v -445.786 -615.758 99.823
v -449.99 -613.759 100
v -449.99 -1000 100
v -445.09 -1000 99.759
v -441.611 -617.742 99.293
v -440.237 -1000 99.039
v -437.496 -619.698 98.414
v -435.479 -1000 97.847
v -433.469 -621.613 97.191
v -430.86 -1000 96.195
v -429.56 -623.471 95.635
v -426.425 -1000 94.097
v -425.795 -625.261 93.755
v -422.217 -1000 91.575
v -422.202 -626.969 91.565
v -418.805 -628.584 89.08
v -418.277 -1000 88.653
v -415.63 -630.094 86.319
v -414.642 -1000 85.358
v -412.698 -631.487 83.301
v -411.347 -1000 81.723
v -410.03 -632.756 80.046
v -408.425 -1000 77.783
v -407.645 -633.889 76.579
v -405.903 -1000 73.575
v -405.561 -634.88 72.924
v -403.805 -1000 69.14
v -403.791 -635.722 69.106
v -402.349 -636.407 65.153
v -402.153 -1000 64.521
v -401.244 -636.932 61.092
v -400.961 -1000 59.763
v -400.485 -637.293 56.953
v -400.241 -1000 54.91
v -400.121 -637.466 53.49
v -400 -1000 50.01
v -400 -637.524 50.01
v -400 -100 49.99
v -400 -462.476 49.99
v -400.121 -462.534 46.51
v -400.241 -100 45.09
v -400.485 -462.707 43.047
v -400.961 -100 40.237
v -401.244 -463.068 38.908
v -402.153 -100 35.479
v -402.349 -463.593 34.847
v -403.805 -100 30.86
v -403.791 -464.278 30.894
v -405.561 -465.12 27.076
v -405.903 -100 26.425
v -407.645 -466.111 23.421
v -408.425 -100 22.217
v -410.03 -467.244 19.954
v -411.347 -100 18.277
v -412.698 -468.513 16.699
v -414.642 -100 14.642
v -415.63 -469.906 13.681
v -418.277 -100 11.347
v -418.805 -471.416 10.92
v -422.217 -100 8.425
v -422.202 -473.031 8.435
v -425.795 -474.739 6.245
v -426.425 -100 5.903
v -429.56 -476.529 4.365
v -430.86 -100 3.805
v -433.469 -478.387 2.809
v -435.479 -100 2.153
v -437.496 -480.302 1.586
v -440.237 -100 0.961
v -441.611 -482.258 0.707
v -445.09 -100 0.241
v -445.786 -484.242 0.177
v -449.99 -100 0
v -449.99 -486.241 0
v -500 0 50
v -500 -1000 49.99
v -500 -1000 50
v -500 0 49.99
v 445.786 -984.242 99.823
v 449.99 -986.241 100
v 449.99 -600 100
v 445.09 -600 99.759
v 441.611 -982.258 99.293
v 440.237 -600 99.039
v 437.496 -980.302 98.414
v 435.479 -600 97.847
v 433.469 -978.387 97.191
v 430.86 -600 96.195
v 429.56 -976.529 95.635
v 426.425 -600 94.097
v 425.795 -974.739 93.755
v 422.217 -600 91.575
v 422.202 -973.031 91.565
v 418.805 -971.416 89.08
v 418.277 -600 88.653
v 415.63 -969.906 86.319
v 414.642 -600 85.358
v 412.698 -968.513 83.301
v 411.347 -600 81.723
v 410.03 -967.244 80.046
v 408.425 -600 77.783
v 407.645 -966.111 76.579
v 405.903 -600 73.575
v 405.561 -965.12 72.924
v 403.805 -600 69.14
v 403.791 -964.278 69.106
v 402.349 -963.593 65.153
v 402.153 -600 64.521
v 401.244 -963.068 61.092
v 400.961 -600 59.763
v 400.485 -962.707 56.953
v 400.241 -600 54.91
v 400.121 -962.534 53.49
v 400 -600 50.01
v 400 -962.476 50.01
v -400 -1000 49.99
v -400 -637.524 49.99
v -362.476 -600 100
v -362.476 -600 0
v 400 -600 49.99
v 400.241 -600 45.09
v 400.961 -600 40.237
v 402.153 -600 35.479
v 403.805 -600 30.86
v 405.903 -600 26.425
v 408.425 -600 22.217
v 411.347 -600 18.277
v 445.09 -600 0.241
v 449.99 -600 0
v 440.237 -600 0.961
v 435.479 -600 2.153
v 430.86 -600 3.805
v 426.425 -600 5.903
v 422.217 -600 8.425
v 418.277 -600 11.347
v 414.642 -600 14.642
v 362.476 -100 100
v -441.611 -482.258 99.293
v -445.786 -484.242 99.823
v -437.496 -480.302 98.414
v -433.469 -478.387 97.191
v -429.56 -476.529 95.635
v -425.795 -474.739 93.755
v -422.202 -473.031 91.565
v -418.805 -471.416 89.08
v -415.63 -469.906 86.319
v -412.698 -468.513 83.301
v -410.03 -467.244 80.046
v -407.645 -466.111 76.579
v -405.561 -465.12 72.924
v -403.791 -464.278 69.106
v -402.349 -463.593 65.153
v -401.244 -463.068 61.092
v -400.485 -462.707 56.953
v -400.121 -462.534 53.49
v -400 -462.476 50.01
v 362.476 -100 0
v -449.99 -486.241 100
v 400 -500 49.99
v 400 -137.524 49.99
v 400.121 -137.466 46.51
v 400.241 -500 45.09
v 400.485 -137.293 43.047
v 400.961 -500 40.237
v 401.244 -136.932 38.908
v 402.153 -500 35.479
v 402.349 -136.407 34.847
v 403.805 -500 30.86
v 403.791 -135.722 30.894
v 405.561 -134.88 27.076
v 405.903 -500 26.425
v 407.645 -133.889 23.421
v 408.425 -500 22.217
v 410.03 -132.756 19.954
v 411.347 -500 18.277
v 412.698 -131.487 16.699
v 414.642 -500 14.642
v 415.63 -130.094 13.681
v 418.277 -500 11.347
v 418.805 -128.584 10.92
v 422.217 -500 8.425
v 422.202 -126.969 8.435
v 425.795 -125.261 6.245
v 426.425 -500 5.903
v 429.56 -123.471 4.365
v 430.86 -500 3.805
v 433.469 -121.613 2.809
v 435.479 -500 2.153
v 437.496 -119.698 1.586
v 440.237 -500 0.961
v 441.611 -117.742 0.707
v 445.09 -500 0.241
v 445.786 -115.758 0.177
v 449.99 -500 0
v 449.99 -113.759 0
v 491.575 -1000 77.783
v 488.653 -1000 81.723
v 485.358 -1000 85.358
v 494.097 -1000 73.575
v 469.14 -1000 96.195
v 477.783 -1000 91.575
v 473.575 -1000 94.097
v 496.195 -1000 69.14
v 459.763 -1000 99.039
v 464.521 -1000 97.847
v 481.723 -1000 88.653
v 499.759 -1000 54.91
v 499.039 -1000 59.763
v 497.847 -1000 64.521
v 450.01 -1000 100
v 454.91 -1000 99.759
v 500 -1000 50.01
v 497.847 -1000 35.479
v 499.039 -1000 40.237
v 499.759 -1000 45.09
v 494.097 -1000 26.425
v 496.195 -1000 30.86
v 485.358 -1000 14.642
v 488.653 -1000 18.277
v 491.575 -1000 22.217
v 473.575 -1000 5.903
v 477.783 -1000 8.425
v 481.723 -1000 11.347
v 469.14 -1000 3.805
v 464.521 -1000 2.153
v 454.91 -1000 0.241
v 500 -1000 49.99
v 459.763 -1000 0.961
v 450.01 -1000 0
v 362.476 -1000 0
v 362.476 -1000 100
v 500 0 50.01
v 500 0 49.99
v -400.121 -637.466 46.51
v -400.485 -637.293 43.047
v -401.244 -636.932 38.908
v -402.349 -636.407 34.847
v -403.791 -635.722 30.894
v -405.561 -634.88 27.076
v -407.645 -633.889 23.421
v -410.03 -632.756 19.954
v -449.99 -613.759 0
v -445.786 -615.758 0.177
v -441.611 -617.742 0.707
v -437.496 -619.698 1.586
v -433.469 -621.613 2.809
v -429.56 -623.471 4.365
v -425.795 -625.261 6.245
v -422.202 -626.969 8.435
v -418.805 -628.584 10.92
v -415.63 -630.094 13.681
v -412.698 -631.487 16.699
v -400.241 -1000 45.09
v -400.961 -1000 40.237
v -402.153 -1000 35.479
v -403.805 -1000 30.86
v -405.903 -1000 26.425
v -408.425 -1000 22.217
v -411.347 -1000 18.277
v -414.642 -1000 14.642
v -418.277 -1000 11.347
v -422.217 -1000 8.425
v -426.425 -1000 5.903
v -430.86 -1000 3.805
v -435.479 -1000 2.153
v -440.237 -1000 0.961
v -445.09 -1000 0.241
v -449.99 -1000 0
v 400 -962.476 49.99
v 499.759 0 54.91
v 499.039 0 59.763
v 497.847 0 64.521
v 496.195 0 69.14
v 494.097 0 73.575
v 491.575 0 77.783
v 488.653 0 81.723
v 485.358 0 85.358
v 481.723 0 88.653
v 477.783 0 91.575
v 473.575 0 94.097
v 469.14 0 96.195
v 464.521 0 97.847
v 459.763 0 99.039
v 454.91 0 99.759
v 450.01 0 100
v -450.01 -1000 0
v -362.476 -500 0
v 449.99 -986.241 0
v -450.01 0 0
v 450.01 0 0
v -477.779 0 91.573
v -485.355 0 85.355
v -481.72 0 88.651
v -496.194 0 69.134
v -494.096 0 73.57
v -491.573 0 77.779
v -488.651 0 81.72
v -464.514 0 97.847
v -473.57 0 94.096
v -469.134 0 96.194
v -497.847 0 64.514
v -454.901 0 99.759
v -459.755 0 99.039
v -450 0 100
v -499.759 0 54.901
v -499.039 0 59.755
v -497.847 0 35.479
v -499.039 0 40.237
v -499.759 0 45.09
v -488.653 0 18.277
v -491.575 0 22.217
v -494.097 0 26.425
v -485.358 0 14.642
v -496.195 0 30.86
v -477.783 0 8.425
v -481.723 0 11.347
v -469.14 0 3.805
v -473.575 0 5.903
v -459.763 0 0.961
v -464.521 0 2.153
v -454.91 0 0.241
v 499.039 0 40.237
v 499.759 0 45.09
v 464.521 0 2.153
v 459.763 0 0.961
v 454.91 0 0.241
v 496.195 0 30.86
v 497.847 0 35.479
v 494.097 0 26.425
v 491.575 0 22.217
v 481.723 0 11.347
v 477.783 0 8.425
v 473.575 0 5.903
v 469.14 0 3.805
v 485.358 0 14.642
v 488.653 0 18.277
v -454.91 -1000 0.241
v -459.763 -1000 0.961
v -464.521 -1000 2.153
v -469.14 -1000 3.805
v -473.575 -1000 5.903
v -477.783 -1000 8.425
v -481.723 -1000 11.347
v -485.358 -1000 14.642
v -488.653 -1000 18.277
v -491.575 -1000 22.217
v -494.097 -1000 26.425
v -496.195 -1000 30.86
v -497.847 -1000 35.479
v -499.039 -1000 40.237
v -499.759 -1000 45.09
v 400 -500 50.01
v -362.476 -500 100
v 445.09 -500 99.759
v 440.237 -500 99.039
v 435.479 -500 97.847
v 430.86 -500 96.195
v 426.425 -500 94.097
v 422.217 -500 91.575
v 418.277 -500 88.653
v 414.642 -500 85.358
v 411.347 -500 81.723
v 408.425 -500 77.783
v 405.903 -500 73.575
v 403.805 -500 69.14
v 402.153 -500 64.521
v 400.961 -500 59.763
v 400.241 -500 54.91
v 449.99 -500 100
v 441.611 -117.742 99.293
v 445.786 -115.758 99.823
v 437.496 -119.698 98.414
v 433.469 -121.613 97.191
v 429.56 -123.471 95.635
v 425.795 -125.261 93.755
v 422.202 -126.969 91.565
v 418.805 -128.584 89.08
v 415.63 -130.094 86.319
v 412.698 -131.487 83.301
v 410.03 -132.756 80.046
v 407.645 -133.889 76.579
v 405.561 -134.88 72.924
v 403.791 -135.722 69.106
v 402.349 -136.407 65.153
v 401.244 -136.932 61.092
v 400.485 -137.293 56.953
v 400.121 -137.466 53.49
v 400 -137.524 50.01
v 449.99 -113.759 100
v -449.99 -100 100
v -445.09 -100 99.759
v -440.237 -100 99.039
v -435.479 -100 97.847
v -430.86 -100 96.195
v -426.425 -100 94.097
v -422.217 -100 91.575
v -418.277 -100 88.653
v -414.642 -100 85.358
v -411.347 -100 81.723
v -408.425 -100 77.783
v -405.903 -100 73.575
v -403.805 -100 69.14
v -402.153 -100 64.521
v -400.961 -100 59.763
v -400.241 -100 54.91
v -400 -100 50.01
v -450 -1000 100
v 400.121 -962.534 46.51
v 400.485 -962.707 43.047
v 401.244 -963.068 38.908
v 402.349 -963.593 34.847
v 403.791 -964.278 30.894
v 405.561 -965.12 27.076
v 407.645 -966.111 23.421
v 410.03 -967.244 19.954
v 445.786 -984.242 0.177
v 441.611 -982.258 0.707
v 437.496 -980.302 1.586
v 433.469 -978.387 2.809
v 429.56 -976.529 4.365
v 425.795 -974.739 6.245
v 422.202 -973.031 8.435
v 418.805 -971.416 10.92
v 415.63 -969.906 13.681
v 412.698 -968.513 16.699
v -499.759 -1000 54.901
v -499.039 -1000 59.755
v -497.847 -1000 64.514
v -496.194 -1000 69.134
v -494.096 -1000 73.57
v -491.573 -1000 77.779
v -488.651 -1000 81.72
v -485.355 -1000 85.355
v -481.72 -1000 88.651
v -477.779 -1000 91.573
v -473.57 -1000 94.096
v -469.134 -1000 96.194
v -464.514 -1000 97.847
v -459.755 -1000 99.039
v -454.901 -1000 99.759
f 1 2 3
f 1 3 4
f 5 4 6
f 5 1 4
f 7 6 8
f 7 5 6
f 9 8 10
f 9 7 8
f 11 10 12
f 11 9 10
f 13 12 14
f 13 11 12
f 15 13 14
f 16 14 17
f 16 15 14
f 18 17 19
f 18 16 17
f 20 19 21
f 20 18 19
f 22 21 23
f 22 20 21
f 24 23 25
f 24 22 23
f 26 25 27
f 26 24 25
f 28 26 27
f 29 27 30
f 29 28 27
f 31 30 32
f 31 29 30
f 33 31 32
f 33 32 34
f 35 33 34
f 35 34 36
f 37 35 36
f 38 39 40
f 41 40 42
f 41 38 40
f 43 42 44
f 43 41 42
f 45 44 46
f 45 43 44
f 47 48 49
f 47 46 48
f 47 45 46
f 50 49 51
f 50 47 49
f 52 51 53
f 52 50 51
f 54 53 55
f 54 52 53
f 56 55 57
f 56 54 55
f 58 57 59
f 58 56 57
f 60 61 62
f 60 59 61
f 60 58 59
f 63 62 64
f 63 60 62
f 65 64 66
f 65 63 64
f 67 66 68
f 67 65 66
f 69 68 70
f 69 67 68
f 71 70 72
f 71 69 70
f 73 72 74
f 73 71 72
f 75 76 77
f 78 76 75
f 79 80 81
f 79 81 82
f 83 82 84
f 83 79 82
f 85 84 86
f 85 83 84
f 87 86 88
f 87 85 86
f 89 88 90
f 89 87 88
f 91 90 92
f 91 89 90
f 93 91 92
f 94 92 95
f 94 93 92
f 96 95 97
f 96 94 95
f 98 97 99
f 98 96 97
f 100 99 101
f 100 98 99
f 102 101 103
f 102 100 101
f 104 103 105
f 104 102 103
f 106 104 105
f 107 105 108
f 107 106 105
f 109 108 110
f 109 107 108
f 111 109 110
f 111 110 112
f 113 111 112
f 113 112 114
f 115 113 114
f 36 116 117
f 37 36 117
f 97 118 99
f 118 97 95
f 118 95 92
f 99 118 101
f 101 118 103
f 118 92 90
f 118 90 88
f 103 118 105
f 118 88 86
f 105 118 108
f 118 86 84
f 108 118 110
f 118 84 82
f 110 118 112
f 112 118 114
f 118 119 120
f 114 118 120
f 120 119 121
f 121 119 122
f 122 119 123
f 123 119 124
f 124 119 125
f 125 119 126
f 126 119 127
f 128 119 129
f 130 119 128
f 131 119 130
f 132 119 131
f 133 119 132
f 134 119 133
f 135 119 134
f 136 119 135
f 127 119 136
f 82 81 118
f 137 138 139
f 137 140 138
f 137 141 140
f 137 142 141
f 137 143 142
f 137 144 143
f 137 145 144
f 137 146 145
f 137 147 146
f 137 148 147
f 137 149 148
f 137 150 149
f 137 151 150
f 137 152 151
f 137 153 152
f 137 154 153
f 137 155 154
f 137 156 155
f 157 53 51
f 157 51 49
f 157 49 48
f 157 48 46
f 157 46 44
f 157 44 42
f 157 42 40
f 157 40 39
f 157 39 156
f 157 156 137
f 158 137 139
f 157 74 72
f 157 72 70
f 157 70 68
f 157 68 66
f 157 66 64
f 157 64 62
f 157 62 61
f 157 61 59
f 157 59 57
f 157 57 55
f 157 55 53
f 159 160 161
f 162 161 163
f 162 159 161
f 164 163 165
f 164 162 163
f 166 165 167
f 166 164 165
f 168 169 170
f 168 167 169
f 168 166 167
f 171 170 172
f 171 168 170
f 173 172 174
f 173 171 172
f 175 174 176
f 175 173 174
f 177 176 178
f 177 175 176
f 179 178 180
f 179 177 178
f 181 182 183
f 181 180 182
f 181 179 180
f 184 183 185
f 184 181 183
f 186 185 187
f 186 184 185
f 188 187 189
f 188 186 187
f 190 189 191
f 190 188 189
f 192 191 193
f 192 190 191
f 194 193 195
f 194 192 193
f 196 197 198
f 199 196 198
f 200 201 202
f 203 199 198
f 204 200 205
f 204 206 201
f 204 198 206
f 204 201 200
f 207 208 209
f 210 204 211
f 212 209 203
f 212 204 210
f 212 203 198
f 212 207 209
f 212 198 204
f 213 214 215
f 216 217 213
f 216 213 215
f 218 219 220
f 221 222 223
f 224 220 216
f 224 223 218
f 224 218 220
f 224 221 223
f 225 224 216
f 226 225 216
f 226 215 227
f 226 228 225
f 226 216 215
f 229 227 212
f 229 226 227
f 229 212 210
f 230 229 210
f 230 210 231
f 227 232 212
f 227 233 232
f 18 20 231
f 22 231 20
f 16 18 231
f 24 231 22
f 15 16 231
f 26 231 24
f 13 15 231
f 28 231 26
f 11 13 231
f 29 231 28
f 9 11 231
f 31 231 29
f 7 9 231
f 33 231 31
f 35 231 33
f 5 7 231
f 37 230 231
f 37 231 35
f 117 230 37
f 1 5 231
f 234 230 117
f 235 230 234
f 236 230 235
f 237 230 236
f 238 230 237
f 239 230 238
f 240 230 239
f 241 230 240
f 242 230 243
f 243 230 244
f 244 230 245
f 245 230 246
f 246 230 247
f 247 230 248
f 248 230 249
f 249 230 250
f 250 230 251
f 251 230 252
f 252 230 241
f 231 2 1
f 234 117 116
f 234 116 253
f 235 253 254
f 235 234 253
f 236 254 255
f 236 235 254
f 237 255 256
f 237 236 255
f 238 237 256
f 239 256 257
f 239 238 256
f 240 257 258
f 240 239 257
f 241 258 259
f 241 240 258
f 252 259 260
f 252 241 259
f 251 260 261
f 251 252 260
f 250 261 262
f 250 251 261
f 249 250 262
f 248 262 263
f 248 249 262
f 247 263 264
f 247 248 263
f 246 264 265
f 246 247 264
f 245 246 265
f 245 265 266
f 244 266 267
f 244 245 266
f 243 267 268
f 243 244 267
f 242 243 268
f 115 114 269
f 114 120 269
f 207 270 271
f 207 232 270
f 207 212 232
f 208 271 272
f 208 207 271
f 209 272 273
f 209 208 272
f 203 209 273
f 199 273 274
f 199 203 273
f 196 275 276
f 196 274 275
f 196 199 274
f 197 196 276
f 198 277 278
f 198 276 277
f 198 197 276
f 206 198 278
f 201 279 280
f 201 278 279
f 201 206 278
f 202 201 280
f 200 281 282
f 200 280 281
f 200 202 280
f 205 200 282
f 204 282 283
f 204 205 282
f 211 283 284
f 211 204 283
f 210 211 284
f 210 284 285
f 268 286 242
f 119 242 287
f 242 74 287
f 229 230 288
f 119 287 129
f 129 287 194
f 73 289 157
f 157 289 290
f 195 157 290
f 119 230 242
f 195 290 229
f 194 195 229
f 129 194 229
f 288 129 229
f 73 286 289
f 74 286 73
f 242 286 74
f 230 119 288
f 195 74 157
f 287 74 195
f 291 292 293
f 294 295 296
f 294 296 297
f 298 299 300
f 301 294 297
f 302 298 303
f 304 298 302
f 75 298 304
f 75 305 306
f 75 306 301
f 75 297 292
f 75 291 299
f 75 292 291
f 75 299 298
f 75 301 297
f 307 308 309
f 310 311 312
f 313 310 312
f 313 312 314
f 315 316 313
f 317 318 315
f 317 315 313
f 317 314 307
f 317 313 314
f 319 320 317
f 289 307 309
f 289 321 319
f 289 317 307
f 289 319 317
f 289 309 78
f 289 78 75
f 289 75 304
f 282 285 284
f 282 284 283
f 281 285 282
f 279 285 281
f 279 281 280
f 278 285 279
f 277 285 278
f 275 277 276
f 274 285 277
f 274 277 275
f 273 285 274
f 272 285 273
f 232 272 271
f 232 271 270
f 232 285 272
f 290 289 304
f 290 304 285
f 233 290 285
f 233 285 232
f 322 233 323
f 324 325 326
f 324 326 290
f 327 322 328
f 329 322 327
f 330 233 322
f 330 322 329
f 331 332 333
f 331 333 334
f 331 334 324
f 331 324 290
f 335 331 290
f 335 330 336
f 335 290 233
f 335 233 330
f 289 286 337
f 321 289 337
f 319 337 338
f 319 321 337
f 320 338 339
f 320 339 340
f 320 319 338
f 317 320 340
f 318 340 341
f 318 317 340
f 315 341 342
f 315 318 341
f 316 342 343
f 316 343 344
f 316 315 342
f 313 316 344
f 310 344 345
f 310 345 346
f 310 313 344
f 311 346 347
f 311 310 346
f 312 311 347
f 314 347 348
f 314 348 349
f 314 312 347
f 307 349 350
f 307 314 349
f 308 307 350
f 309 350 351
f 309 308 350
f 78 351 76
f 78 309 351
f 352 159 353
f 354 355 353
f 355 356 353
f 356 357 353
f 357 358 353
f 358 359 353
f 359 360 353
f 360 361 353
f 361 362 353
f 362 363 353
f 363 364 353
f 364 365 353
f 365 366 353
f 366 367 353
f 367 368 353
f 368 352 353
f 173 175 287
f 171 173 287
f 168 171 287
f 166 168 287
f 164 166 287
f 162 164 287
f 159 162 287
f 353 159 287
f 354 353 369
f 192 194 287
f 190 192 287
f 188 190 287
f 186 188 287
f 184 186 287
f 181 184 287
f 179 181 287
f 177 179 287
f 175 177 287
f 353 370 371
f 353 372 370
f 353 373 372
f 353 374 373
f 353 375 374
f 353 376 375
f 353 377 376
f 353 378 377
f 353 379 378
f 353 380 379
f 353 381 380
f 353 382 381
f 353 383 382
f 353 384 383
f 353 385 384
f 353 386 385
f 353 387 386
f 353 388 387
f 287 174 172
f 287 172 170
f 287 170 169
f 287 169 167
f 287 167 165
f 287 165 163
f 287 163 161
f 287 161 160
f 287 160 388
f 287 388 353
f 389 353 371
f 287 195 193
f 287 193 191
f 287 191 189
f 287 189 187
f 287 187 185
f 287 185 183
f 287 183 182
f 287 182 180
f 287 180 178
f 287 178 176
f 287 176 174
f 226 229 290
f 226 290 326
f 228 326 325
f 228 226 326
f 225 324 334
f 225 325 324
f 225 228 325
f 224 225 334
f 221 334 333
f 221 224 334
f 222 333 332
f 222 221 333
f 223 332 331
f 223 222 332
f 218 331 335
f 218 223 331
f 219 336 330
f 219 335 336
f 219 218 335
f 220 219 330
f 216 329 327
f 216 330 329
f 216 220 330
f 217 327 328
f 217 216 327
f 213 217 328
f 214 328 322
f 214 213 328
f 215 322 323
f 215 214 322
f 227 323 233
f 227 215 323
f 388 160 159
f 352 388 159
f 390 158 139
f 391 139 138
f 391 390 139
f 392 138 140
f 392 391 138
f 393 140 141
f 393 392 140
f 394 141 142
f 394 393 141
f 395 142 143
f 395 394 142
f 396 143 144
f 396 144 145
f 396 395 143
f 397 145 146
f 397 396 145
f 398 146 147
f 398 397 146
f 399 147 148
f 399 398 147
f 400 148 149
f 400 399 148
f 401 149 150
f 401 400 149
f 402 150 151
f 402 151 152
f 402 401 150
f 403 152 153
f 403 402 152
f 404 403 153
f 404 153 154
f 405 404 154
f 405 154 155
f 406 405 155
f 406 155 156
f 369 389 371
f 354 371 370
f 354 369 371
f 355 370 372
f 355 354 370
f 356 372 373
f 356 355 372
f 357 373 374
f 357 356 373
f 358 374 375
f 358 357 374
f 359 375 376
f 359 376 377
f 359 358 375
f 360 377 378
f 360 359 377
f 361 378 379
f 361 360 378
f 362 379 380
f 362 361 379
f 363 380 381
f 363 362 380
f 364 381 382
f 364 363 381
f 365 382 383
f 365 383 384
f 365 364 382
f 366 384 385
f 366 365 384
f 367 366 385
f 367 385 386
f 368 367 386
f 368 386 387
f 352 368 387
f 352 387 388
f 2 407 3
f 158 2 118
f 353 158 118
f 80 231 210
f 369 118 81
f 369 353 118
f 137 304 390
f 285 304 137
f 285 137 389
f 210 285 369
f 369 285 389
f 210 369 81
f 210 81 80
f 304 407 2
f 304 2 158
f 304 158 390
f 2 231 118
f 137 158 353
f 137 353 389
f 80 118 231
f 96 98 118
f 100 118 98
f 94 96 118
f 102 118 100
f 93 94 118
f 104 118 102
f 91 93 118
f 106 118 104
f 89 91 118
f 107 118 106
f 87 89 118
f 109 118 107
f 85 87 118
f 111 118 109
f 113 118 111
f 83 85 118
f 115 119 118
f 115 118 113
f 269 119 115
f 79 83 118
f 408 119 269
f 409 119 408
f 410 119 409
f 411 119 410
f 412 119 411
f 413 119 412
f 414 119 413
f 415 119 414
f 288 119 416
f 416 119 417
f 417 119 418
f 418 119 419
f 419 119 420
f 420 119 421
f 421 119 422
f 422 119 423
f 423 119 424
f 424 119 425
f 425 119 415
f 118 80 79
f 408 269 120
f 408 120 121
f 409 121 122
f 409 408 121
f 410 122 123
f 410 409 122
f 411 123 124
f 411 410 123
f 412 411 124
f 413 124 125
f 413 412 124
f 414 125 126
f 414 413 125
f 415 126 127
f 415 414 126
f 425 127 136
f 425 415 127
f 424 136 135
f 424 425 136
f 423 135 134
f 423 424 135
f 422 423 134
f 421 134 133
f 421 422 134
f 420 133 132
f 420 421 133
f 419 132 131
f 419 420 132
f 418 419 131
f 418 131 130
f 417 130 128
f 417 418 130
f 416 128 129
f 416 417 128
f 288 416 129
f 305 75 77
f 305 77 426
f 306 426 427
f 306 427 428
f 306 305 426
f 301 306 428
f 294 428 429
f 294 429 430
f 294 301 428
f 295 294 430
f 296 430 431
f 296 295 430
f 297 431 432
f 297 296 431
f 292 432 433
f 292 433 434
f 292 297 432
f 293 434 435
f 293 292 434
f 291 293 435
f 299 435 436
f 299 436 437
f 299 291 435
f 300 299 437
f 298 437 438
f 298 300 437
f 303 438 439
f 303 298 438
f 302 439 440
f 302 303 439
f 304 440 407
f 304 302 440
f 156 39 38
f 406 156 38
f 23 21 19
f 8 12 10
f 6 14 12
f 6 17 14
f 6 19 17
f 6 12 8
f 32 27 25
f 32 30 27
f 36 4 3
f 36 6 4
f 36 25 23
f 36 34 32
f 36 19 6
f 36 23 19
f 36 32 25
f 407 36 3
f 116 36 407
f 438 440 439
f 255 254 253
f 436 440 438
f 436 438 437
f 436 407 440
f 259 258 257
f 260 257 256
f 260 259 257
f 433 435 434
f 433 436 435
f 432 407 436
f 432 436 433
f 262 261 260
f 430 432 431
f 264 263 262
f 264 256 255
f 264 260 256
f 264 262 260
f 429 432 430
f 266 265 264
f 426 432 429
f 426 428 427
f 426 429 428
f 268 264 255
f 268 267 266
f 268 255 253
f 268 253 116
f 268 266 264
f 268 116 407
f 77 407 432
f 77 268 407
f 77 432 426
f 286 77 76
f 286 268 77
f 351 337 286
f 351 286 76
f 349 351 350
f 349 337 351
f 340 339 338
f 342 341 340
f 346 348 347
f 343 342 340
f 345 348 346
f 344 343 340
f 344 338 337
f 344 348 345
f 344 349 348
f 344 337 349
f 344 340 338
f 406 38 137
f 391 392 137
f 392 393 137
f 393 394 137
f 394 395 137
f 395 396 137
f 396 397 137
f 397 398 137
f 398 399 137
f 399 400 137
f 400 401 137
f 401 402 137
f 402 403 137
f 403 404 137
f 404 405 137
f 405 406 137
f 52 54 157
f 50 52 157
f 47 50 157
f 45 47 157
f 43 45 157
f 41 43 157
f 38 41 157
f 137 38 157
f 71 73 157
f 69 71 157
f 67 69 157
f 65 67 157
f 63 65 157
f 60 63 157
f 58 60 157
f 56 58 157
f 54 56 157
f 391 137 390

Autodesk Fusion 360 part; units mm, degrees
sketch "スケッチ1" plane through (0, 0, 0) normal (0, 0, 1) x (1, 0, 0)
  line L0 (-500, 0) -> (500, 0)
  line L1 (500, 0) -> (500, -1000)
  line L2 (-500, -1000) -> (-500, 0)
  line L3 (-400, -100) -> (362.4762, -100)
  line L4 (400, -137.5238) -> (400, -500)
  line L5 (400, -500) -> (-362.4762, -500)
  line L6 (-400, -462.4762) -> (-400, -100)
  line L7 (-362.4762, -600) -> (400, -600)
  line L8 (400, -600) -> (400, -962.4762)
  line L9 (400, -1000) -> (362.4762, -1000)
  line L10 (-400, -1000) -> (-400, -637.5238)
  line L11 (-400, -462.4762) -> (362.4762, -100)
  line L12 (400, -137.5238) -> (-362.4762, -500)
  line L13 (-362.4762, -600) -> (400, -962.4762)
  line L14 (362.4762, -1000) -> (-400, -637.5238)
  line L15 (500, -1000) -> (362.4762, -1000)
  line L16 (-400, -1000) -> (-500, -1000)
  line L17 (-400, -462.4762) -> (-400, -500) construction
  line L18 (-400, -500) -> (-362.4762, -500) construction
  line L19 (-362.4762, -600) -> (-400, -600) construction
  line L20 (-400, -600) -> (-400, -637.5238) construction
  line L21 (362.4762, -100) -> (400, -100) construction
  line L22 (400, -100) -> (400, -137.5238) construction
  line L23 (400, -962.4762) -> (400, -1000) construction
  line L24 (-400, -1000) -> (362.4762, -1000) construction
  dimension "d5" = 400
  dimension "d6" = 800
  dimension "d7" = 100
  dimension "d8" = 100
  dimension "d9" = 100
  dimension "d10" = 100
  dimension "d11" = 400
  dimension "d12" = 50
  dimension "d13" = 50
extrude "押し出し1" add sketch "スケッチ1" along normal blind 100
fillet "フィレット1" radius 50 1 edges at (-500, -500, 100)
fillet "フィレット2" radius 50 1 edges at (-400, -281.2381, 100)
fillet "フィレット3" radius 50 1 edges at (-400, -818.7619, 100)
fillet "フィレット4" radius 50 3 edges at (400, -318.7619, 100) (400, -781.2381, 100) (500, -500, 100)
fillet "フィレット5" radius 50 6 edges at (-500, -500, 0) (-400, -818.7619, 0) (-400, -281.2381, 0) (400, -318.7619, 0) (400, -781.2381, 0) (500, -500, 0)
